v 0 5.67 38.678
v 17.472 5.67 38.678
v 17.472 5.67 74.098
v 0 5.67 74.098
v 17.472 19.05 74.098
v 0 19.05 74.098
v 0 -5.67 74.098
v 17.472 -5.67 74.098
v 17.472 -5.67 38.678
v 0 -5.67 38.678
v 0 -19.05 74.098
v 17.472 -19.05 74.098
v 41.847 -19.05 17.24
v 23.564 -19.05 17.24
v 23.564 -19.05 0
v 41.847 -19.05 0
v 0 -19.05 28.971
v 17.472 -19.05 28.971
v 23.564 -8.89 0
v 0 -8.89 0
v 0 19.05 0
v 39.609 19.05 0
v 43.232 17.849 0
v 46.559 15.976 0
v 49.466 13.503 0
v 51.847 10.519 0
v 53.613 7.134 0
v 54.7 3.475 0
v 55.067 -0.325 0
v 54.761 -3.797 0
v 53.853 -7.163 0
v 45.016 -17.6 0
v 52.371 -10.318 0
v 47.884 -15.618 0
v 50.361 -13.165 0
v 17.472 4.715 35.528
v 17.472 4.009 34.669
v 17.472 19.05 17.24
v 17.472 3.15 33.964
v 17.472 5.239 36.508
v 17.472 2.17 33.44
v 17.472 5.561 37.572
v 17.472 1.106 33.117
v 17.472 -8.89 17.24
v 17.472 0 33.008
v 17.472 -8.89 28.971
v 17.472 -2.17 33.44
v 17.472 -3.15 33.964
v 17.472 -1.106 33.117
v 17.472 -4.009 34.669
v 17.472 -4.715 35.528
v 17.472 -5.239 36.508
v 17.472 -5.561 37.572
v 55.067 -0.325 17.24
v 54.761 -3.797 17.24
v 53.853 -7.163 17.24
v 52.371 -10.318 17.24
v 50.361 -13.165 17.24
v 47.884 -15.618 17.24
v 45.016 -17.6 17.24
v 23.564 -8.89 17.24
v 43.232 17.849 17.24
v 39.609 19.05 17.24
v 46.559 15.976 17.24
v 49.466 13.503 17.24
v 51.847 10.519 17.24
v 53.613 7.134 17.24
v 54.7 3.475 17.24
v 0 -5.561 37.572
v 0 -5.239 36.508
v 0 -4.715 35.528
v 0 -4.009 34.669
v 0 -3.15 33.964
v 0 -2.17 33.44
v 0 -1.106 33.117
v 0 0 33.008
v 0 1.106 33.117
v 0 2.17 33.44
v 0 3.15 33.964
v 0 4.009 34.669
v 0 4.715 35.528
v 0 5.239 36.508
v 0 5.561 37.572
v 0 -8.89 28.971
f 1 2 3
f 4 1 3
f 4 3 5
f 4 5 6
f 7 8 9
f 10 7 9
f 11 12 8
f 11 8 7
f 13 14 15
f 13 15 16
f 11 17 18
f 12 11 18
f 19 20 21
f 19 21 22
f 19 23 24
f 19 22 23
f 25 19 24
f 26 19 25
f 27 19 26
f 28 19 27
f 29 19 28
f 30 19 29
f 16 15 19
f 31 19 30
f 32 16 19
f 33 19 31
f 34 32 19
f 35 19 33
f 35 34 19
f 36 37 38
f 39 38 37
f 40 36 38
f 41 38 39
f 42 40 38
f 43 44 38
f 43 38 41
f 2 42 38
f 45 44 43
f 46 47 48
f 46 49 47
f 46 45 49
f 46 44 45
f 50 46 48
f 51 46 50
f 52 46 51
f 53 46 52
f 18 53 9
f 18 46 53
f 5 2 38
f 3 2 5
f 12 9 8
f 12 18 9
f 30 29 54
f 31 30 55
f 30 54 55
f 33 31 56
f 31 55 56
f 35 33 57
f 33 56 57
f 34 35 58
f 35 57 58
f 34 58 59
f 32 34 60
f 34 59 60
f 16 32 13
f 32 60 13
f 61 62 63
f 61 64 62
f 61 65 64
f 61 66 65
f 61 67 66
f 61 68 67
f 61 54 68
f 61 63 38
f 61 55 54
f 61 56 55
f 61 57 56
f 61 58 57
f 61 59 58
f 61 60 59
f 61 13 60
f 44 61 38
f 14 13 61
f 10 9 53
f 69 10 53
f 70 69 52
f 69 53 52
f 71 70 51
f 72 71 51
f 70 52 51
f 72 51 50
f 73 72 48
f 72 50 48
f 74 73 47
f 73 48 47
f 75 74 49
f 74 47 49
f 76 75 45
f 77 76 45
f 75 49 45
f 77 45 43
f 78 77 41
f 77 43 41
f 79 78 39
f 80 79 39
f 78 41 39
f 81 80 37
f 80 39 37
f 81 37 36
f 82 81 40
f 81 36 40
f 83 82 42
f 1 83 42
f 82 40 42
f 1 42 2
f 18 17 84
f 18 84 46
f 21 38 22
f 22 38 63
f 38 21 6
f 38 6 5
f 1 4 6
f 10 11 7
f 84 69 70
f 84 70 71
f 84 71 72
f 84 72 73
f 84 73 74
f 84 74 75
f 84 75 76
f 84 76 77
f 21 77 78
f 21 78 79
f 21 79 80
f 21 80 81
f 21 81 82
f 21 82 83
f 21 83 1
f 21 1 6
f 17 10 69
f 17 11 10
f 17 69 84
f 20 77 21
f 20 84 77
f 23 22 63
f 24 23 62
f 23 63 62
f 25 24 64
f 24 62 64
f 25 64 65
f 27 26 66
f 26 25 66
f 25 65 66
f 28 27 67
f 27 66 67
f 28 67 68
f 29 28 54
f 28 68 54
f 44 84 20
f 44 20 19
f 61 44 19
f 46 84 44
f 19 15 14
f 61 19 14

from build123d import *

# Parameters (mm, degrees)
F1_DEPTH = 19.05
F3_DEPTH = 17.2409580479
F5_DEPTH = 25.4
F6_W     = 23.5642232001
F6_H     = 34.1768339276
F7_DEPTH = 10.16


with BuildPart() as f1:
    # F0 (on Front) → F1 (new body, symmetric)
    with BuildSketch(Plane.XZ):
        Polygon((17.4721237272, 74.0977823734), (0, 74.0977823734), (0, 0), (55.0666376948, 0), (55.0666376948, 17.2399580479), (17.4721237272, 17.2399580479), align=None)
    extrude(amount=F1_DEPTH, both=True)

    # F2 (on face) → F3 (cut, through all)
    with BuildSketch(Plane.XY.offset(17.2399580479)):
        with BuildLine():
            ThreePointArc((55.0666376948, -0.3249626733), (51.4285906353, -11.785735895), (41.846567036, -19.05))
            Line((41.846567036, -19.05), (55.0666376948, -19.05))
            Line((55.0666376948, -19.05), (55.0666376948, -0.3249626733))
        make_face()
        with BuildLine():
            ThreePointArc((39.6085269749, 19.05), (50.7285952231, 12.0680027235), (55.0666376948, -0.3249626733))
            Line((55.0666376948, -0.3249626733), (55.0666376948, 19.05))
            Line((55.0666376948, 19.05), (39.6085269749, 19.05))
        make_face()
    extrude(amount=-F3_DEPTH, mode=Mode.SUBTRACT)

    # F4 (on face) → F5 (cut)
    with BuildSketch(Plane.YZ.offset(17.4721237272)):
        with BuildLine():
            Line((5.6702466682, 74.0977823734), (-5.6702466682, 74.0977823734))
            Line((-5.6702466682, 74.0977823734), (-5.6702466682, 38.6781468987))
            ThreePointArc((-5.6702466682, 38.6781468987), (0, 33.0079002306), (5.6702466682, 38.6781468987))
            Line((5.6702466682, 38.6781468987), (5.6702466682, 74.0977823734))
        make_face()
    extrude(amount=-F5_DEPTH, mode=Mode.SUBTRACT)

    # F6 (on face) → F7 (cut)
    with BuildSketch(Plane.XZ.offset(19.05)):
        with Locations((11.7821116, 11.8823200464)):
            Rectangle(F6_W, F6_H)
    extrude(amount=-F7_DEPTH, mode=Mode.SUBTRACT)


solid = f1.part
